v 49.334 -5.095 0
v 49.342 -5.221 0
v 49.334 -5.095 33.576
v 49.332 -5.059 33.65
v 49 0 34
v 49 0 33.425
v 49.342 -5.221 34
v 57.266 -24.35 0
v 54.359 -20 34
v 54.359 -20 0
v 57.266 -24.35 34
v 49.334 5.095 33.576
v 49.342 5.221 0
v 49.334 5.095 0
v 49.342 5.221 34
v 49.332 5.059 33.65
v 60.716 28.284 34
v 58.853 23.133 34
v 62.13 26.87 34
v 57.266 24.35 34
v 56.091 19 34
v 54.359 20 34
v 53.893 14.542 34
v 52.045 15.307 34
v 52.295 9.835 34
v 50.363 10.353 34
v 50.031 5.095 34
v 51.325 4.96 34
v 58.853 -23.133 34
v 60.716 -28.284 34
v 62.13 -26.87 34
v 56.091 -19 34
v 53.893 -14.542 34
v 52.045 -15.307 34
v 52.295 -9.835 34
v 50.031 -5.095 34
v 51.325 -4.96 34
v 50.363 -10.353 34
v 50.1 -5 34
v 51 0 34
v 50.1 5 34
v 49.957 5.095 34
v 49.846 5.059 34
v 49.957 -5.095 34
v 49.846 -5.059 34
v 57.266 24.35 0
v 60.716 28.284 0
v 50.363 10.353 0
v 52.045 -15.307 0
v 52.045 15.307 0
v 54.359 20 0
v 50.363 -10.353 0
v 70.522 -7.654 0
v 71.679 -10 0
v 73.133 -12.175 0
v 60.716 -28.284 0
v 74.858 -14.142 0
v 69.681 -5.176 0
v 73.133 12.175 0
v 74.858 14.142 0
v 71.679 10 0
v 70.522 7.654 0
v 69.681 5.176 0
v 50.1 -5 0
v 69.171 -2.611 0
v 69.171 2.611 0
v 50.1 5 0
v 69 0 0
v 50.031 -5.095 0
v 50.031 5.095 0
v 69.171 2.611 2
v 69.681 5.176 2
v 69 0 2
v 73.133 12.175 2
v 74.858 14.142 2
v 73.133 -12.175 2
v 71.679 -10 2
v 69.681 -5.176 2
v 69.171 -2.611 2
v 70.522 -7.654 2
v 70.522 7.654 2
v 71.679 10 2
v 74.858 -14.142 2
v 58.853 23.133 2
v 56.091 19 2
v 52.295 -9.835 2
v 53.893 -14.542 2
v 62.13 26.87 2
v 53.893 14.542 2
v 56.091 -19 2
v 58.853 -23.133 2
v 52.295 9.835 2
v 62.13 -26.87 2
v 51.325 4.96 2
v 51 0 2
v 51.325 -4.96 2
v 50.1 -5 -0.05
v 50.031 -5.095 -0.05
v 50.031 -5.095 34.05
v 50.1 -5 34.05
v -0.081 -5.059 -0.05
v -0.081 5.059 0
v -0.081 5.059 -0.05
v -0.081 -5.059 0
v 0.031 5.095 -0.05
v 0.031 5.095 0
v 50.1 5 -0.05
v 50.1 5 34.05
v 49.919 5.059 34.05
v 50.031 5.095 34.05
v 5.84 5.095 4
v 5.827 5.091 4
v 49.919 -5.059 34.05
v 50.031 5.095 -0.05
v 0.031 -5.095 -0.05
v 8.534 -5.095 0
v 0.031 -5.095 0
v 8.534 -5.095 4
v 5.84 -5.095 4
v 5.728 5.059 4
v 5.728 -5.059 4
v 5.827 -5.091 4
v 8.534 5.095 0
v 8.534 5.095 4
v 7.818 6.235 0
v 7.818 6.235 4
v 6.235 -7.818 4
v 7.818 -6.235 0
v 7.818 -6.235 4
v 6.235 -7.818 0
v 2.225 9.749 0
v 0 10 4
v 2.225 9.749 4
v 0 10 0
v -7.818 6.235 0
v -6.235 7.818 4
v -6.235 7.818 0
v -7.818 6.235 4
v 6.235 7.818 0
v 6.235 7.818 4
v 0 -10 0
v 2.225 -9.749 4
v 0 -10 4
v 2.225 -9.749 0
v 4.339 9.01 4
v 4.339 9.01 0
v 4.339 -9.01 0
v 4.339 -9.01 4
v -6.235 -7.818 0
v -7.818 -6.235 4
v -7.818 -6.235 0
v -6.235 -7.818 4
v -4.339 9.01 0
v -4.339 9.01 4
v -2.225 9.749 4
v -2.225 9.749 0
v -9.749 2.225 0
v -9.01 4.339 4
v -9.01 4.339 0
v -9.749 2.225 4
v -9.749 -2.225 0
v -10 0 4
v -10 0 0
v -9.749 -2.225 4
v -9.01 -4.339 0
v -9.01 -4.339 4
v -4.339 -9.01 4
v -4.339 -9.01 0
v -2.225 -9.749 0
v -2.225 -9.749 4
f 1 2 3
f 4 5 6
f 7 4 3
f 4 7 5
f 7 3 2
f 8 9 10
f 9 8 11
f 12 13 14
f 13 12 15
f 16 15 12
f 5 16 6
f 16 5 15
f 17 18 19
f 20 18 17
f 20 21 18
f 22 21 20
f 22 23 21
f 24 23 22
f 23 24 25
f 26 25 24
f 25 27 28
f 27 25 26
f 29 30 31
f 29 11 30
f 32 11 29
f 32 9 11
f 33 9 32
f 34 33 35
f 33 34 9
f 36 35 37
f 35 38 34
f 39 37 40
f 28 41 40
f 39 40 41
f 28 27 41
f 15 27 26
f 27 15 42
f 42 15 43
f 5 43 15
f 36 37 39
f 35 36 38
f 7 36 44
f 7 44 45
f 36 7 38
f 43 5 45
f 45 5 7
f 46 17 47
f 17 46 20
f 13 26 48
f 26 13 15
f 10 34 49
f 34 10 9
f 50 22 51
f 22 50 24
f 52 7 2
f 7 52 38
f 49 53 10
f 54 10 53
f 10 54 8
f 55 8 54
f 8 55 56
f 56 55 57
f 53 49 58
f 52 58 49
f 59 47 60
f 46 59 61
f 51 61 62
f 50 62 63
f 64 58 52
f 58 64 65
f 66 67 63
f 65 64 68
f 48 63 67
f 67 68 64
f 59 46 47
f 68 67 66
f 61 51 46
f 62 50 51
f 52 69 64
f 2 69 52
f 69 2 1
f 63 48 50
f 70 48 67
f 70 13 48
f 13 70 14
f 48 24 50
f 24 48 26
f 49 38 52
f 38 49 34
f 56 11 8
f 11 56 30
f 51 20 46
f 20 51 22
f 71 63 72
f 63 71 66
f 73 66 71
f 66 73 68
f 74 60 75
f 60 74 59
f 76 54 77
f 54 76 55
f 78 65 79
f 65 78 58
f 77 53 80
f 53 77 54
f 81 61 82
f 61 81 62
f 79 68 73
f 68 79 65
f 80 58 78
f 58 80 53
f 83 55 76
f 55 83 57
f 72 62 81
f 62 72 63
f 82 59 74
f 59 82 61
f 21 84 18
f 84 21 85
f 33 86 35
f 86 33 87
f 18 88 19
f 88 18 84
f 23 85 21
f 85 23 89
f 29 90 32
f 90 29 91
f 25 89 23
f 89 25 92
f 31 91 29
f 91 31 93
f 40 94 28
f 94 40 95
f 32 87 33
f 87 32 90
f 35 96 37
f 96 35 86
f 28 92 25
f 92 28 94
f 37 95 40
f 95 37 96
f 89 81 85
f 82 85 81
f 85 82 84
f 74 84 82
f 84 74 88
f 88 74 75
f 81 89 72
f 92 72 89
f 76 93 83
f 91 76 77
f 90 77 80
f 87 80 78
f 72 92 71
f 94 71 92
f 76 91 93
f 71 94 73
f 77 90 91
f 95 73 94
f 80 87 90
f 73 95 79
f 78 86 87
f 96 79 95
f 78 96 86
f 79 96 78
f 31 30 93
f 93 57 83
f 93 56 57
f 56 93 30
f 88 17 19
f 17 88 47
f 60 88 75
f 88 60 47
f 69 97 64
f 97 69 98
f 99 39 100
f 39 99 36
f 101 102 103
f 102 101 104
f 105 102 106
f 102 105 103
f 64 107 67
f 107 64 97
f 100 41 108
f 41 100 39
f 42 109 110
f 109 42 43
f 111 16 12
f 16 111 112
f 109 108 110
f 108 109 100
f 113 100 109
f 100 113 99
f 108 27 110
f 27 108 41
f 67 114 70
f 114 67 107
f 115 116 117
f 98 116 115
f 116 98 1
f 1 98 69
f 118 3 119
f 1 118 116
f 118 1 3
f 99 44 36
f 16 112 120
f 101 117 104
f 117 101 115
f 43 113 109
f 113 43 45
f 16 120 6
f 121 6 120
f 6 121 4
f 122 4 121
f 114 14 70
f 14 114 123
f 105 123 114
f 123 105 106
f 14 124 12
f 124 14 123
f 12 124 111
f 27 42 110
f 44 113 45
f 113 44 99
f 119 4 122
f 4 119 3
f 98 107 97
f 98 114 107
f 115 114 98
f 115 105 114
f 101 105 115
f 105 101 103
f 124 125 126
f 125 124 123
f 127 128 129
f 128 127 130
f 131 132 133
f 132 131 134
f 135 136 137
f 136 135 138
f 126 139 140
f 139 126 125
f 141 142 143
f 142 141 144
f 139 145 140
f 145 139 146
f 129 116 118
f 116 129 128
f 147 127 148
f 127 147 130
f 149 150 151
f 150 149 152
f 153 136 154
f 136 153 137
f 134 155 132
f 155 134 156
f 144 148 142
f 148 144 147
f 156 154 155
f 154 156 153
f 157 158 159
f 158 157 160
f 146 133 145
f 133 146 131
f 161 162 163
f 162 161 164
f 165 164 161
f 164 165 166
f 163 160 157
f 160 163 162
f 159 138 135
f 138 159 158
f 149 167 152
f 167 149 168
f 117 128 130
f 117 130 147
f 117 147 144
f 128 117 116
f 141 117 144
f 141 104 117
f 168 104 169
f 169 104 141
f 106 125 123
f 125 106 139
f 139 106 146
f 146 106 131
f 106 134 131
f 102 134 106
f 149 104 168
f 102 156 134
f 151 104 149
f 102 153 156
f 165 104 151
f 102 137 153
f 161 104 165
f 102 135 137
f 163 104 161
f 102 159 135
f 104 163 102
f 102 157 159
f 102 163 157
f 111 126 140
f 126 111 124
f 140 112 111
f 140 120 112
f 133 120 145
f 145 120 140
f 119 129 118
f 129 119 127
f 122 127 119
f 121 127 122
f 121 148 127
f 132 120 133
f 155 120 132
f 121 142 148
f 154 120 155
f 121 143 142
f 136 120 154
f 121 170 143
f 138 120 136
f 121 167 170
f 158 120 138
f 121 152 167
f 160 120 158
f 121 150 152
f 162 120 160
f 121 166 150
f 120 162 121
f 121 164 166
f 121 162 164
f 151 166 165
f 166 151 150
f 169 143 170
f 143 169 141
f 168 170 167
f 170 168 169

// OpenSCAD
height = 34;
bottle_radius = 40;
arm_length = 50;

module point(x,y,z)
{
    translate([x,y,z])
    cylinder(r=0.1,h=0.1,center=true);
}

difference()
{
    hull()
    {
        point(0,-5,0);
        point(0,5,0);

        point(arm_length,-5,0);
        point(arm_length,5,0);

        point(arm_length,-5,height);
        point(arm_length,5,height);
    }
        
    /*
    translate([77,-5.5,5])
    cube([3,11,5]);

    translate([77,-5.5,40])
    cube([3,11,5]);
    */
    /*
    translate([20,5.5,2 + 2.5])
    rotate([90,0,0])
    rotate([0,0,90])
    cylinder(r=5,h=11,$fn=3);

    translate([40,5.5,2 + 6.5])
    rotate([90,0,0])
    rotate([0,0,90])
    cylinder(r=13,h=11,$fn=3);

    translate([79,5.5,2 + 13])
    rotate([90,0,0])
    rotate([0,0,90])
    cylinder(r=26,h=11,$fn=3);
    */
}
cylinder(r=10,h=4,$fn=28);

translate([arm_length + bottle_radius - 1,0,0])
intersection()
{
    difference()
    {
        cylinder(r=bottle_radius,h=height,$fn=48);
        
        cylinder(r=bottle_radius - bottle_radius/2,h=height,$fn=48);

        translate([0,0,2])
        cylinder(r=bottle_radius - 2,h=height + 0.2,$fn=48);
    }
    rotate([0,0,180 - 45])
    cube([180,180,80]);
}
